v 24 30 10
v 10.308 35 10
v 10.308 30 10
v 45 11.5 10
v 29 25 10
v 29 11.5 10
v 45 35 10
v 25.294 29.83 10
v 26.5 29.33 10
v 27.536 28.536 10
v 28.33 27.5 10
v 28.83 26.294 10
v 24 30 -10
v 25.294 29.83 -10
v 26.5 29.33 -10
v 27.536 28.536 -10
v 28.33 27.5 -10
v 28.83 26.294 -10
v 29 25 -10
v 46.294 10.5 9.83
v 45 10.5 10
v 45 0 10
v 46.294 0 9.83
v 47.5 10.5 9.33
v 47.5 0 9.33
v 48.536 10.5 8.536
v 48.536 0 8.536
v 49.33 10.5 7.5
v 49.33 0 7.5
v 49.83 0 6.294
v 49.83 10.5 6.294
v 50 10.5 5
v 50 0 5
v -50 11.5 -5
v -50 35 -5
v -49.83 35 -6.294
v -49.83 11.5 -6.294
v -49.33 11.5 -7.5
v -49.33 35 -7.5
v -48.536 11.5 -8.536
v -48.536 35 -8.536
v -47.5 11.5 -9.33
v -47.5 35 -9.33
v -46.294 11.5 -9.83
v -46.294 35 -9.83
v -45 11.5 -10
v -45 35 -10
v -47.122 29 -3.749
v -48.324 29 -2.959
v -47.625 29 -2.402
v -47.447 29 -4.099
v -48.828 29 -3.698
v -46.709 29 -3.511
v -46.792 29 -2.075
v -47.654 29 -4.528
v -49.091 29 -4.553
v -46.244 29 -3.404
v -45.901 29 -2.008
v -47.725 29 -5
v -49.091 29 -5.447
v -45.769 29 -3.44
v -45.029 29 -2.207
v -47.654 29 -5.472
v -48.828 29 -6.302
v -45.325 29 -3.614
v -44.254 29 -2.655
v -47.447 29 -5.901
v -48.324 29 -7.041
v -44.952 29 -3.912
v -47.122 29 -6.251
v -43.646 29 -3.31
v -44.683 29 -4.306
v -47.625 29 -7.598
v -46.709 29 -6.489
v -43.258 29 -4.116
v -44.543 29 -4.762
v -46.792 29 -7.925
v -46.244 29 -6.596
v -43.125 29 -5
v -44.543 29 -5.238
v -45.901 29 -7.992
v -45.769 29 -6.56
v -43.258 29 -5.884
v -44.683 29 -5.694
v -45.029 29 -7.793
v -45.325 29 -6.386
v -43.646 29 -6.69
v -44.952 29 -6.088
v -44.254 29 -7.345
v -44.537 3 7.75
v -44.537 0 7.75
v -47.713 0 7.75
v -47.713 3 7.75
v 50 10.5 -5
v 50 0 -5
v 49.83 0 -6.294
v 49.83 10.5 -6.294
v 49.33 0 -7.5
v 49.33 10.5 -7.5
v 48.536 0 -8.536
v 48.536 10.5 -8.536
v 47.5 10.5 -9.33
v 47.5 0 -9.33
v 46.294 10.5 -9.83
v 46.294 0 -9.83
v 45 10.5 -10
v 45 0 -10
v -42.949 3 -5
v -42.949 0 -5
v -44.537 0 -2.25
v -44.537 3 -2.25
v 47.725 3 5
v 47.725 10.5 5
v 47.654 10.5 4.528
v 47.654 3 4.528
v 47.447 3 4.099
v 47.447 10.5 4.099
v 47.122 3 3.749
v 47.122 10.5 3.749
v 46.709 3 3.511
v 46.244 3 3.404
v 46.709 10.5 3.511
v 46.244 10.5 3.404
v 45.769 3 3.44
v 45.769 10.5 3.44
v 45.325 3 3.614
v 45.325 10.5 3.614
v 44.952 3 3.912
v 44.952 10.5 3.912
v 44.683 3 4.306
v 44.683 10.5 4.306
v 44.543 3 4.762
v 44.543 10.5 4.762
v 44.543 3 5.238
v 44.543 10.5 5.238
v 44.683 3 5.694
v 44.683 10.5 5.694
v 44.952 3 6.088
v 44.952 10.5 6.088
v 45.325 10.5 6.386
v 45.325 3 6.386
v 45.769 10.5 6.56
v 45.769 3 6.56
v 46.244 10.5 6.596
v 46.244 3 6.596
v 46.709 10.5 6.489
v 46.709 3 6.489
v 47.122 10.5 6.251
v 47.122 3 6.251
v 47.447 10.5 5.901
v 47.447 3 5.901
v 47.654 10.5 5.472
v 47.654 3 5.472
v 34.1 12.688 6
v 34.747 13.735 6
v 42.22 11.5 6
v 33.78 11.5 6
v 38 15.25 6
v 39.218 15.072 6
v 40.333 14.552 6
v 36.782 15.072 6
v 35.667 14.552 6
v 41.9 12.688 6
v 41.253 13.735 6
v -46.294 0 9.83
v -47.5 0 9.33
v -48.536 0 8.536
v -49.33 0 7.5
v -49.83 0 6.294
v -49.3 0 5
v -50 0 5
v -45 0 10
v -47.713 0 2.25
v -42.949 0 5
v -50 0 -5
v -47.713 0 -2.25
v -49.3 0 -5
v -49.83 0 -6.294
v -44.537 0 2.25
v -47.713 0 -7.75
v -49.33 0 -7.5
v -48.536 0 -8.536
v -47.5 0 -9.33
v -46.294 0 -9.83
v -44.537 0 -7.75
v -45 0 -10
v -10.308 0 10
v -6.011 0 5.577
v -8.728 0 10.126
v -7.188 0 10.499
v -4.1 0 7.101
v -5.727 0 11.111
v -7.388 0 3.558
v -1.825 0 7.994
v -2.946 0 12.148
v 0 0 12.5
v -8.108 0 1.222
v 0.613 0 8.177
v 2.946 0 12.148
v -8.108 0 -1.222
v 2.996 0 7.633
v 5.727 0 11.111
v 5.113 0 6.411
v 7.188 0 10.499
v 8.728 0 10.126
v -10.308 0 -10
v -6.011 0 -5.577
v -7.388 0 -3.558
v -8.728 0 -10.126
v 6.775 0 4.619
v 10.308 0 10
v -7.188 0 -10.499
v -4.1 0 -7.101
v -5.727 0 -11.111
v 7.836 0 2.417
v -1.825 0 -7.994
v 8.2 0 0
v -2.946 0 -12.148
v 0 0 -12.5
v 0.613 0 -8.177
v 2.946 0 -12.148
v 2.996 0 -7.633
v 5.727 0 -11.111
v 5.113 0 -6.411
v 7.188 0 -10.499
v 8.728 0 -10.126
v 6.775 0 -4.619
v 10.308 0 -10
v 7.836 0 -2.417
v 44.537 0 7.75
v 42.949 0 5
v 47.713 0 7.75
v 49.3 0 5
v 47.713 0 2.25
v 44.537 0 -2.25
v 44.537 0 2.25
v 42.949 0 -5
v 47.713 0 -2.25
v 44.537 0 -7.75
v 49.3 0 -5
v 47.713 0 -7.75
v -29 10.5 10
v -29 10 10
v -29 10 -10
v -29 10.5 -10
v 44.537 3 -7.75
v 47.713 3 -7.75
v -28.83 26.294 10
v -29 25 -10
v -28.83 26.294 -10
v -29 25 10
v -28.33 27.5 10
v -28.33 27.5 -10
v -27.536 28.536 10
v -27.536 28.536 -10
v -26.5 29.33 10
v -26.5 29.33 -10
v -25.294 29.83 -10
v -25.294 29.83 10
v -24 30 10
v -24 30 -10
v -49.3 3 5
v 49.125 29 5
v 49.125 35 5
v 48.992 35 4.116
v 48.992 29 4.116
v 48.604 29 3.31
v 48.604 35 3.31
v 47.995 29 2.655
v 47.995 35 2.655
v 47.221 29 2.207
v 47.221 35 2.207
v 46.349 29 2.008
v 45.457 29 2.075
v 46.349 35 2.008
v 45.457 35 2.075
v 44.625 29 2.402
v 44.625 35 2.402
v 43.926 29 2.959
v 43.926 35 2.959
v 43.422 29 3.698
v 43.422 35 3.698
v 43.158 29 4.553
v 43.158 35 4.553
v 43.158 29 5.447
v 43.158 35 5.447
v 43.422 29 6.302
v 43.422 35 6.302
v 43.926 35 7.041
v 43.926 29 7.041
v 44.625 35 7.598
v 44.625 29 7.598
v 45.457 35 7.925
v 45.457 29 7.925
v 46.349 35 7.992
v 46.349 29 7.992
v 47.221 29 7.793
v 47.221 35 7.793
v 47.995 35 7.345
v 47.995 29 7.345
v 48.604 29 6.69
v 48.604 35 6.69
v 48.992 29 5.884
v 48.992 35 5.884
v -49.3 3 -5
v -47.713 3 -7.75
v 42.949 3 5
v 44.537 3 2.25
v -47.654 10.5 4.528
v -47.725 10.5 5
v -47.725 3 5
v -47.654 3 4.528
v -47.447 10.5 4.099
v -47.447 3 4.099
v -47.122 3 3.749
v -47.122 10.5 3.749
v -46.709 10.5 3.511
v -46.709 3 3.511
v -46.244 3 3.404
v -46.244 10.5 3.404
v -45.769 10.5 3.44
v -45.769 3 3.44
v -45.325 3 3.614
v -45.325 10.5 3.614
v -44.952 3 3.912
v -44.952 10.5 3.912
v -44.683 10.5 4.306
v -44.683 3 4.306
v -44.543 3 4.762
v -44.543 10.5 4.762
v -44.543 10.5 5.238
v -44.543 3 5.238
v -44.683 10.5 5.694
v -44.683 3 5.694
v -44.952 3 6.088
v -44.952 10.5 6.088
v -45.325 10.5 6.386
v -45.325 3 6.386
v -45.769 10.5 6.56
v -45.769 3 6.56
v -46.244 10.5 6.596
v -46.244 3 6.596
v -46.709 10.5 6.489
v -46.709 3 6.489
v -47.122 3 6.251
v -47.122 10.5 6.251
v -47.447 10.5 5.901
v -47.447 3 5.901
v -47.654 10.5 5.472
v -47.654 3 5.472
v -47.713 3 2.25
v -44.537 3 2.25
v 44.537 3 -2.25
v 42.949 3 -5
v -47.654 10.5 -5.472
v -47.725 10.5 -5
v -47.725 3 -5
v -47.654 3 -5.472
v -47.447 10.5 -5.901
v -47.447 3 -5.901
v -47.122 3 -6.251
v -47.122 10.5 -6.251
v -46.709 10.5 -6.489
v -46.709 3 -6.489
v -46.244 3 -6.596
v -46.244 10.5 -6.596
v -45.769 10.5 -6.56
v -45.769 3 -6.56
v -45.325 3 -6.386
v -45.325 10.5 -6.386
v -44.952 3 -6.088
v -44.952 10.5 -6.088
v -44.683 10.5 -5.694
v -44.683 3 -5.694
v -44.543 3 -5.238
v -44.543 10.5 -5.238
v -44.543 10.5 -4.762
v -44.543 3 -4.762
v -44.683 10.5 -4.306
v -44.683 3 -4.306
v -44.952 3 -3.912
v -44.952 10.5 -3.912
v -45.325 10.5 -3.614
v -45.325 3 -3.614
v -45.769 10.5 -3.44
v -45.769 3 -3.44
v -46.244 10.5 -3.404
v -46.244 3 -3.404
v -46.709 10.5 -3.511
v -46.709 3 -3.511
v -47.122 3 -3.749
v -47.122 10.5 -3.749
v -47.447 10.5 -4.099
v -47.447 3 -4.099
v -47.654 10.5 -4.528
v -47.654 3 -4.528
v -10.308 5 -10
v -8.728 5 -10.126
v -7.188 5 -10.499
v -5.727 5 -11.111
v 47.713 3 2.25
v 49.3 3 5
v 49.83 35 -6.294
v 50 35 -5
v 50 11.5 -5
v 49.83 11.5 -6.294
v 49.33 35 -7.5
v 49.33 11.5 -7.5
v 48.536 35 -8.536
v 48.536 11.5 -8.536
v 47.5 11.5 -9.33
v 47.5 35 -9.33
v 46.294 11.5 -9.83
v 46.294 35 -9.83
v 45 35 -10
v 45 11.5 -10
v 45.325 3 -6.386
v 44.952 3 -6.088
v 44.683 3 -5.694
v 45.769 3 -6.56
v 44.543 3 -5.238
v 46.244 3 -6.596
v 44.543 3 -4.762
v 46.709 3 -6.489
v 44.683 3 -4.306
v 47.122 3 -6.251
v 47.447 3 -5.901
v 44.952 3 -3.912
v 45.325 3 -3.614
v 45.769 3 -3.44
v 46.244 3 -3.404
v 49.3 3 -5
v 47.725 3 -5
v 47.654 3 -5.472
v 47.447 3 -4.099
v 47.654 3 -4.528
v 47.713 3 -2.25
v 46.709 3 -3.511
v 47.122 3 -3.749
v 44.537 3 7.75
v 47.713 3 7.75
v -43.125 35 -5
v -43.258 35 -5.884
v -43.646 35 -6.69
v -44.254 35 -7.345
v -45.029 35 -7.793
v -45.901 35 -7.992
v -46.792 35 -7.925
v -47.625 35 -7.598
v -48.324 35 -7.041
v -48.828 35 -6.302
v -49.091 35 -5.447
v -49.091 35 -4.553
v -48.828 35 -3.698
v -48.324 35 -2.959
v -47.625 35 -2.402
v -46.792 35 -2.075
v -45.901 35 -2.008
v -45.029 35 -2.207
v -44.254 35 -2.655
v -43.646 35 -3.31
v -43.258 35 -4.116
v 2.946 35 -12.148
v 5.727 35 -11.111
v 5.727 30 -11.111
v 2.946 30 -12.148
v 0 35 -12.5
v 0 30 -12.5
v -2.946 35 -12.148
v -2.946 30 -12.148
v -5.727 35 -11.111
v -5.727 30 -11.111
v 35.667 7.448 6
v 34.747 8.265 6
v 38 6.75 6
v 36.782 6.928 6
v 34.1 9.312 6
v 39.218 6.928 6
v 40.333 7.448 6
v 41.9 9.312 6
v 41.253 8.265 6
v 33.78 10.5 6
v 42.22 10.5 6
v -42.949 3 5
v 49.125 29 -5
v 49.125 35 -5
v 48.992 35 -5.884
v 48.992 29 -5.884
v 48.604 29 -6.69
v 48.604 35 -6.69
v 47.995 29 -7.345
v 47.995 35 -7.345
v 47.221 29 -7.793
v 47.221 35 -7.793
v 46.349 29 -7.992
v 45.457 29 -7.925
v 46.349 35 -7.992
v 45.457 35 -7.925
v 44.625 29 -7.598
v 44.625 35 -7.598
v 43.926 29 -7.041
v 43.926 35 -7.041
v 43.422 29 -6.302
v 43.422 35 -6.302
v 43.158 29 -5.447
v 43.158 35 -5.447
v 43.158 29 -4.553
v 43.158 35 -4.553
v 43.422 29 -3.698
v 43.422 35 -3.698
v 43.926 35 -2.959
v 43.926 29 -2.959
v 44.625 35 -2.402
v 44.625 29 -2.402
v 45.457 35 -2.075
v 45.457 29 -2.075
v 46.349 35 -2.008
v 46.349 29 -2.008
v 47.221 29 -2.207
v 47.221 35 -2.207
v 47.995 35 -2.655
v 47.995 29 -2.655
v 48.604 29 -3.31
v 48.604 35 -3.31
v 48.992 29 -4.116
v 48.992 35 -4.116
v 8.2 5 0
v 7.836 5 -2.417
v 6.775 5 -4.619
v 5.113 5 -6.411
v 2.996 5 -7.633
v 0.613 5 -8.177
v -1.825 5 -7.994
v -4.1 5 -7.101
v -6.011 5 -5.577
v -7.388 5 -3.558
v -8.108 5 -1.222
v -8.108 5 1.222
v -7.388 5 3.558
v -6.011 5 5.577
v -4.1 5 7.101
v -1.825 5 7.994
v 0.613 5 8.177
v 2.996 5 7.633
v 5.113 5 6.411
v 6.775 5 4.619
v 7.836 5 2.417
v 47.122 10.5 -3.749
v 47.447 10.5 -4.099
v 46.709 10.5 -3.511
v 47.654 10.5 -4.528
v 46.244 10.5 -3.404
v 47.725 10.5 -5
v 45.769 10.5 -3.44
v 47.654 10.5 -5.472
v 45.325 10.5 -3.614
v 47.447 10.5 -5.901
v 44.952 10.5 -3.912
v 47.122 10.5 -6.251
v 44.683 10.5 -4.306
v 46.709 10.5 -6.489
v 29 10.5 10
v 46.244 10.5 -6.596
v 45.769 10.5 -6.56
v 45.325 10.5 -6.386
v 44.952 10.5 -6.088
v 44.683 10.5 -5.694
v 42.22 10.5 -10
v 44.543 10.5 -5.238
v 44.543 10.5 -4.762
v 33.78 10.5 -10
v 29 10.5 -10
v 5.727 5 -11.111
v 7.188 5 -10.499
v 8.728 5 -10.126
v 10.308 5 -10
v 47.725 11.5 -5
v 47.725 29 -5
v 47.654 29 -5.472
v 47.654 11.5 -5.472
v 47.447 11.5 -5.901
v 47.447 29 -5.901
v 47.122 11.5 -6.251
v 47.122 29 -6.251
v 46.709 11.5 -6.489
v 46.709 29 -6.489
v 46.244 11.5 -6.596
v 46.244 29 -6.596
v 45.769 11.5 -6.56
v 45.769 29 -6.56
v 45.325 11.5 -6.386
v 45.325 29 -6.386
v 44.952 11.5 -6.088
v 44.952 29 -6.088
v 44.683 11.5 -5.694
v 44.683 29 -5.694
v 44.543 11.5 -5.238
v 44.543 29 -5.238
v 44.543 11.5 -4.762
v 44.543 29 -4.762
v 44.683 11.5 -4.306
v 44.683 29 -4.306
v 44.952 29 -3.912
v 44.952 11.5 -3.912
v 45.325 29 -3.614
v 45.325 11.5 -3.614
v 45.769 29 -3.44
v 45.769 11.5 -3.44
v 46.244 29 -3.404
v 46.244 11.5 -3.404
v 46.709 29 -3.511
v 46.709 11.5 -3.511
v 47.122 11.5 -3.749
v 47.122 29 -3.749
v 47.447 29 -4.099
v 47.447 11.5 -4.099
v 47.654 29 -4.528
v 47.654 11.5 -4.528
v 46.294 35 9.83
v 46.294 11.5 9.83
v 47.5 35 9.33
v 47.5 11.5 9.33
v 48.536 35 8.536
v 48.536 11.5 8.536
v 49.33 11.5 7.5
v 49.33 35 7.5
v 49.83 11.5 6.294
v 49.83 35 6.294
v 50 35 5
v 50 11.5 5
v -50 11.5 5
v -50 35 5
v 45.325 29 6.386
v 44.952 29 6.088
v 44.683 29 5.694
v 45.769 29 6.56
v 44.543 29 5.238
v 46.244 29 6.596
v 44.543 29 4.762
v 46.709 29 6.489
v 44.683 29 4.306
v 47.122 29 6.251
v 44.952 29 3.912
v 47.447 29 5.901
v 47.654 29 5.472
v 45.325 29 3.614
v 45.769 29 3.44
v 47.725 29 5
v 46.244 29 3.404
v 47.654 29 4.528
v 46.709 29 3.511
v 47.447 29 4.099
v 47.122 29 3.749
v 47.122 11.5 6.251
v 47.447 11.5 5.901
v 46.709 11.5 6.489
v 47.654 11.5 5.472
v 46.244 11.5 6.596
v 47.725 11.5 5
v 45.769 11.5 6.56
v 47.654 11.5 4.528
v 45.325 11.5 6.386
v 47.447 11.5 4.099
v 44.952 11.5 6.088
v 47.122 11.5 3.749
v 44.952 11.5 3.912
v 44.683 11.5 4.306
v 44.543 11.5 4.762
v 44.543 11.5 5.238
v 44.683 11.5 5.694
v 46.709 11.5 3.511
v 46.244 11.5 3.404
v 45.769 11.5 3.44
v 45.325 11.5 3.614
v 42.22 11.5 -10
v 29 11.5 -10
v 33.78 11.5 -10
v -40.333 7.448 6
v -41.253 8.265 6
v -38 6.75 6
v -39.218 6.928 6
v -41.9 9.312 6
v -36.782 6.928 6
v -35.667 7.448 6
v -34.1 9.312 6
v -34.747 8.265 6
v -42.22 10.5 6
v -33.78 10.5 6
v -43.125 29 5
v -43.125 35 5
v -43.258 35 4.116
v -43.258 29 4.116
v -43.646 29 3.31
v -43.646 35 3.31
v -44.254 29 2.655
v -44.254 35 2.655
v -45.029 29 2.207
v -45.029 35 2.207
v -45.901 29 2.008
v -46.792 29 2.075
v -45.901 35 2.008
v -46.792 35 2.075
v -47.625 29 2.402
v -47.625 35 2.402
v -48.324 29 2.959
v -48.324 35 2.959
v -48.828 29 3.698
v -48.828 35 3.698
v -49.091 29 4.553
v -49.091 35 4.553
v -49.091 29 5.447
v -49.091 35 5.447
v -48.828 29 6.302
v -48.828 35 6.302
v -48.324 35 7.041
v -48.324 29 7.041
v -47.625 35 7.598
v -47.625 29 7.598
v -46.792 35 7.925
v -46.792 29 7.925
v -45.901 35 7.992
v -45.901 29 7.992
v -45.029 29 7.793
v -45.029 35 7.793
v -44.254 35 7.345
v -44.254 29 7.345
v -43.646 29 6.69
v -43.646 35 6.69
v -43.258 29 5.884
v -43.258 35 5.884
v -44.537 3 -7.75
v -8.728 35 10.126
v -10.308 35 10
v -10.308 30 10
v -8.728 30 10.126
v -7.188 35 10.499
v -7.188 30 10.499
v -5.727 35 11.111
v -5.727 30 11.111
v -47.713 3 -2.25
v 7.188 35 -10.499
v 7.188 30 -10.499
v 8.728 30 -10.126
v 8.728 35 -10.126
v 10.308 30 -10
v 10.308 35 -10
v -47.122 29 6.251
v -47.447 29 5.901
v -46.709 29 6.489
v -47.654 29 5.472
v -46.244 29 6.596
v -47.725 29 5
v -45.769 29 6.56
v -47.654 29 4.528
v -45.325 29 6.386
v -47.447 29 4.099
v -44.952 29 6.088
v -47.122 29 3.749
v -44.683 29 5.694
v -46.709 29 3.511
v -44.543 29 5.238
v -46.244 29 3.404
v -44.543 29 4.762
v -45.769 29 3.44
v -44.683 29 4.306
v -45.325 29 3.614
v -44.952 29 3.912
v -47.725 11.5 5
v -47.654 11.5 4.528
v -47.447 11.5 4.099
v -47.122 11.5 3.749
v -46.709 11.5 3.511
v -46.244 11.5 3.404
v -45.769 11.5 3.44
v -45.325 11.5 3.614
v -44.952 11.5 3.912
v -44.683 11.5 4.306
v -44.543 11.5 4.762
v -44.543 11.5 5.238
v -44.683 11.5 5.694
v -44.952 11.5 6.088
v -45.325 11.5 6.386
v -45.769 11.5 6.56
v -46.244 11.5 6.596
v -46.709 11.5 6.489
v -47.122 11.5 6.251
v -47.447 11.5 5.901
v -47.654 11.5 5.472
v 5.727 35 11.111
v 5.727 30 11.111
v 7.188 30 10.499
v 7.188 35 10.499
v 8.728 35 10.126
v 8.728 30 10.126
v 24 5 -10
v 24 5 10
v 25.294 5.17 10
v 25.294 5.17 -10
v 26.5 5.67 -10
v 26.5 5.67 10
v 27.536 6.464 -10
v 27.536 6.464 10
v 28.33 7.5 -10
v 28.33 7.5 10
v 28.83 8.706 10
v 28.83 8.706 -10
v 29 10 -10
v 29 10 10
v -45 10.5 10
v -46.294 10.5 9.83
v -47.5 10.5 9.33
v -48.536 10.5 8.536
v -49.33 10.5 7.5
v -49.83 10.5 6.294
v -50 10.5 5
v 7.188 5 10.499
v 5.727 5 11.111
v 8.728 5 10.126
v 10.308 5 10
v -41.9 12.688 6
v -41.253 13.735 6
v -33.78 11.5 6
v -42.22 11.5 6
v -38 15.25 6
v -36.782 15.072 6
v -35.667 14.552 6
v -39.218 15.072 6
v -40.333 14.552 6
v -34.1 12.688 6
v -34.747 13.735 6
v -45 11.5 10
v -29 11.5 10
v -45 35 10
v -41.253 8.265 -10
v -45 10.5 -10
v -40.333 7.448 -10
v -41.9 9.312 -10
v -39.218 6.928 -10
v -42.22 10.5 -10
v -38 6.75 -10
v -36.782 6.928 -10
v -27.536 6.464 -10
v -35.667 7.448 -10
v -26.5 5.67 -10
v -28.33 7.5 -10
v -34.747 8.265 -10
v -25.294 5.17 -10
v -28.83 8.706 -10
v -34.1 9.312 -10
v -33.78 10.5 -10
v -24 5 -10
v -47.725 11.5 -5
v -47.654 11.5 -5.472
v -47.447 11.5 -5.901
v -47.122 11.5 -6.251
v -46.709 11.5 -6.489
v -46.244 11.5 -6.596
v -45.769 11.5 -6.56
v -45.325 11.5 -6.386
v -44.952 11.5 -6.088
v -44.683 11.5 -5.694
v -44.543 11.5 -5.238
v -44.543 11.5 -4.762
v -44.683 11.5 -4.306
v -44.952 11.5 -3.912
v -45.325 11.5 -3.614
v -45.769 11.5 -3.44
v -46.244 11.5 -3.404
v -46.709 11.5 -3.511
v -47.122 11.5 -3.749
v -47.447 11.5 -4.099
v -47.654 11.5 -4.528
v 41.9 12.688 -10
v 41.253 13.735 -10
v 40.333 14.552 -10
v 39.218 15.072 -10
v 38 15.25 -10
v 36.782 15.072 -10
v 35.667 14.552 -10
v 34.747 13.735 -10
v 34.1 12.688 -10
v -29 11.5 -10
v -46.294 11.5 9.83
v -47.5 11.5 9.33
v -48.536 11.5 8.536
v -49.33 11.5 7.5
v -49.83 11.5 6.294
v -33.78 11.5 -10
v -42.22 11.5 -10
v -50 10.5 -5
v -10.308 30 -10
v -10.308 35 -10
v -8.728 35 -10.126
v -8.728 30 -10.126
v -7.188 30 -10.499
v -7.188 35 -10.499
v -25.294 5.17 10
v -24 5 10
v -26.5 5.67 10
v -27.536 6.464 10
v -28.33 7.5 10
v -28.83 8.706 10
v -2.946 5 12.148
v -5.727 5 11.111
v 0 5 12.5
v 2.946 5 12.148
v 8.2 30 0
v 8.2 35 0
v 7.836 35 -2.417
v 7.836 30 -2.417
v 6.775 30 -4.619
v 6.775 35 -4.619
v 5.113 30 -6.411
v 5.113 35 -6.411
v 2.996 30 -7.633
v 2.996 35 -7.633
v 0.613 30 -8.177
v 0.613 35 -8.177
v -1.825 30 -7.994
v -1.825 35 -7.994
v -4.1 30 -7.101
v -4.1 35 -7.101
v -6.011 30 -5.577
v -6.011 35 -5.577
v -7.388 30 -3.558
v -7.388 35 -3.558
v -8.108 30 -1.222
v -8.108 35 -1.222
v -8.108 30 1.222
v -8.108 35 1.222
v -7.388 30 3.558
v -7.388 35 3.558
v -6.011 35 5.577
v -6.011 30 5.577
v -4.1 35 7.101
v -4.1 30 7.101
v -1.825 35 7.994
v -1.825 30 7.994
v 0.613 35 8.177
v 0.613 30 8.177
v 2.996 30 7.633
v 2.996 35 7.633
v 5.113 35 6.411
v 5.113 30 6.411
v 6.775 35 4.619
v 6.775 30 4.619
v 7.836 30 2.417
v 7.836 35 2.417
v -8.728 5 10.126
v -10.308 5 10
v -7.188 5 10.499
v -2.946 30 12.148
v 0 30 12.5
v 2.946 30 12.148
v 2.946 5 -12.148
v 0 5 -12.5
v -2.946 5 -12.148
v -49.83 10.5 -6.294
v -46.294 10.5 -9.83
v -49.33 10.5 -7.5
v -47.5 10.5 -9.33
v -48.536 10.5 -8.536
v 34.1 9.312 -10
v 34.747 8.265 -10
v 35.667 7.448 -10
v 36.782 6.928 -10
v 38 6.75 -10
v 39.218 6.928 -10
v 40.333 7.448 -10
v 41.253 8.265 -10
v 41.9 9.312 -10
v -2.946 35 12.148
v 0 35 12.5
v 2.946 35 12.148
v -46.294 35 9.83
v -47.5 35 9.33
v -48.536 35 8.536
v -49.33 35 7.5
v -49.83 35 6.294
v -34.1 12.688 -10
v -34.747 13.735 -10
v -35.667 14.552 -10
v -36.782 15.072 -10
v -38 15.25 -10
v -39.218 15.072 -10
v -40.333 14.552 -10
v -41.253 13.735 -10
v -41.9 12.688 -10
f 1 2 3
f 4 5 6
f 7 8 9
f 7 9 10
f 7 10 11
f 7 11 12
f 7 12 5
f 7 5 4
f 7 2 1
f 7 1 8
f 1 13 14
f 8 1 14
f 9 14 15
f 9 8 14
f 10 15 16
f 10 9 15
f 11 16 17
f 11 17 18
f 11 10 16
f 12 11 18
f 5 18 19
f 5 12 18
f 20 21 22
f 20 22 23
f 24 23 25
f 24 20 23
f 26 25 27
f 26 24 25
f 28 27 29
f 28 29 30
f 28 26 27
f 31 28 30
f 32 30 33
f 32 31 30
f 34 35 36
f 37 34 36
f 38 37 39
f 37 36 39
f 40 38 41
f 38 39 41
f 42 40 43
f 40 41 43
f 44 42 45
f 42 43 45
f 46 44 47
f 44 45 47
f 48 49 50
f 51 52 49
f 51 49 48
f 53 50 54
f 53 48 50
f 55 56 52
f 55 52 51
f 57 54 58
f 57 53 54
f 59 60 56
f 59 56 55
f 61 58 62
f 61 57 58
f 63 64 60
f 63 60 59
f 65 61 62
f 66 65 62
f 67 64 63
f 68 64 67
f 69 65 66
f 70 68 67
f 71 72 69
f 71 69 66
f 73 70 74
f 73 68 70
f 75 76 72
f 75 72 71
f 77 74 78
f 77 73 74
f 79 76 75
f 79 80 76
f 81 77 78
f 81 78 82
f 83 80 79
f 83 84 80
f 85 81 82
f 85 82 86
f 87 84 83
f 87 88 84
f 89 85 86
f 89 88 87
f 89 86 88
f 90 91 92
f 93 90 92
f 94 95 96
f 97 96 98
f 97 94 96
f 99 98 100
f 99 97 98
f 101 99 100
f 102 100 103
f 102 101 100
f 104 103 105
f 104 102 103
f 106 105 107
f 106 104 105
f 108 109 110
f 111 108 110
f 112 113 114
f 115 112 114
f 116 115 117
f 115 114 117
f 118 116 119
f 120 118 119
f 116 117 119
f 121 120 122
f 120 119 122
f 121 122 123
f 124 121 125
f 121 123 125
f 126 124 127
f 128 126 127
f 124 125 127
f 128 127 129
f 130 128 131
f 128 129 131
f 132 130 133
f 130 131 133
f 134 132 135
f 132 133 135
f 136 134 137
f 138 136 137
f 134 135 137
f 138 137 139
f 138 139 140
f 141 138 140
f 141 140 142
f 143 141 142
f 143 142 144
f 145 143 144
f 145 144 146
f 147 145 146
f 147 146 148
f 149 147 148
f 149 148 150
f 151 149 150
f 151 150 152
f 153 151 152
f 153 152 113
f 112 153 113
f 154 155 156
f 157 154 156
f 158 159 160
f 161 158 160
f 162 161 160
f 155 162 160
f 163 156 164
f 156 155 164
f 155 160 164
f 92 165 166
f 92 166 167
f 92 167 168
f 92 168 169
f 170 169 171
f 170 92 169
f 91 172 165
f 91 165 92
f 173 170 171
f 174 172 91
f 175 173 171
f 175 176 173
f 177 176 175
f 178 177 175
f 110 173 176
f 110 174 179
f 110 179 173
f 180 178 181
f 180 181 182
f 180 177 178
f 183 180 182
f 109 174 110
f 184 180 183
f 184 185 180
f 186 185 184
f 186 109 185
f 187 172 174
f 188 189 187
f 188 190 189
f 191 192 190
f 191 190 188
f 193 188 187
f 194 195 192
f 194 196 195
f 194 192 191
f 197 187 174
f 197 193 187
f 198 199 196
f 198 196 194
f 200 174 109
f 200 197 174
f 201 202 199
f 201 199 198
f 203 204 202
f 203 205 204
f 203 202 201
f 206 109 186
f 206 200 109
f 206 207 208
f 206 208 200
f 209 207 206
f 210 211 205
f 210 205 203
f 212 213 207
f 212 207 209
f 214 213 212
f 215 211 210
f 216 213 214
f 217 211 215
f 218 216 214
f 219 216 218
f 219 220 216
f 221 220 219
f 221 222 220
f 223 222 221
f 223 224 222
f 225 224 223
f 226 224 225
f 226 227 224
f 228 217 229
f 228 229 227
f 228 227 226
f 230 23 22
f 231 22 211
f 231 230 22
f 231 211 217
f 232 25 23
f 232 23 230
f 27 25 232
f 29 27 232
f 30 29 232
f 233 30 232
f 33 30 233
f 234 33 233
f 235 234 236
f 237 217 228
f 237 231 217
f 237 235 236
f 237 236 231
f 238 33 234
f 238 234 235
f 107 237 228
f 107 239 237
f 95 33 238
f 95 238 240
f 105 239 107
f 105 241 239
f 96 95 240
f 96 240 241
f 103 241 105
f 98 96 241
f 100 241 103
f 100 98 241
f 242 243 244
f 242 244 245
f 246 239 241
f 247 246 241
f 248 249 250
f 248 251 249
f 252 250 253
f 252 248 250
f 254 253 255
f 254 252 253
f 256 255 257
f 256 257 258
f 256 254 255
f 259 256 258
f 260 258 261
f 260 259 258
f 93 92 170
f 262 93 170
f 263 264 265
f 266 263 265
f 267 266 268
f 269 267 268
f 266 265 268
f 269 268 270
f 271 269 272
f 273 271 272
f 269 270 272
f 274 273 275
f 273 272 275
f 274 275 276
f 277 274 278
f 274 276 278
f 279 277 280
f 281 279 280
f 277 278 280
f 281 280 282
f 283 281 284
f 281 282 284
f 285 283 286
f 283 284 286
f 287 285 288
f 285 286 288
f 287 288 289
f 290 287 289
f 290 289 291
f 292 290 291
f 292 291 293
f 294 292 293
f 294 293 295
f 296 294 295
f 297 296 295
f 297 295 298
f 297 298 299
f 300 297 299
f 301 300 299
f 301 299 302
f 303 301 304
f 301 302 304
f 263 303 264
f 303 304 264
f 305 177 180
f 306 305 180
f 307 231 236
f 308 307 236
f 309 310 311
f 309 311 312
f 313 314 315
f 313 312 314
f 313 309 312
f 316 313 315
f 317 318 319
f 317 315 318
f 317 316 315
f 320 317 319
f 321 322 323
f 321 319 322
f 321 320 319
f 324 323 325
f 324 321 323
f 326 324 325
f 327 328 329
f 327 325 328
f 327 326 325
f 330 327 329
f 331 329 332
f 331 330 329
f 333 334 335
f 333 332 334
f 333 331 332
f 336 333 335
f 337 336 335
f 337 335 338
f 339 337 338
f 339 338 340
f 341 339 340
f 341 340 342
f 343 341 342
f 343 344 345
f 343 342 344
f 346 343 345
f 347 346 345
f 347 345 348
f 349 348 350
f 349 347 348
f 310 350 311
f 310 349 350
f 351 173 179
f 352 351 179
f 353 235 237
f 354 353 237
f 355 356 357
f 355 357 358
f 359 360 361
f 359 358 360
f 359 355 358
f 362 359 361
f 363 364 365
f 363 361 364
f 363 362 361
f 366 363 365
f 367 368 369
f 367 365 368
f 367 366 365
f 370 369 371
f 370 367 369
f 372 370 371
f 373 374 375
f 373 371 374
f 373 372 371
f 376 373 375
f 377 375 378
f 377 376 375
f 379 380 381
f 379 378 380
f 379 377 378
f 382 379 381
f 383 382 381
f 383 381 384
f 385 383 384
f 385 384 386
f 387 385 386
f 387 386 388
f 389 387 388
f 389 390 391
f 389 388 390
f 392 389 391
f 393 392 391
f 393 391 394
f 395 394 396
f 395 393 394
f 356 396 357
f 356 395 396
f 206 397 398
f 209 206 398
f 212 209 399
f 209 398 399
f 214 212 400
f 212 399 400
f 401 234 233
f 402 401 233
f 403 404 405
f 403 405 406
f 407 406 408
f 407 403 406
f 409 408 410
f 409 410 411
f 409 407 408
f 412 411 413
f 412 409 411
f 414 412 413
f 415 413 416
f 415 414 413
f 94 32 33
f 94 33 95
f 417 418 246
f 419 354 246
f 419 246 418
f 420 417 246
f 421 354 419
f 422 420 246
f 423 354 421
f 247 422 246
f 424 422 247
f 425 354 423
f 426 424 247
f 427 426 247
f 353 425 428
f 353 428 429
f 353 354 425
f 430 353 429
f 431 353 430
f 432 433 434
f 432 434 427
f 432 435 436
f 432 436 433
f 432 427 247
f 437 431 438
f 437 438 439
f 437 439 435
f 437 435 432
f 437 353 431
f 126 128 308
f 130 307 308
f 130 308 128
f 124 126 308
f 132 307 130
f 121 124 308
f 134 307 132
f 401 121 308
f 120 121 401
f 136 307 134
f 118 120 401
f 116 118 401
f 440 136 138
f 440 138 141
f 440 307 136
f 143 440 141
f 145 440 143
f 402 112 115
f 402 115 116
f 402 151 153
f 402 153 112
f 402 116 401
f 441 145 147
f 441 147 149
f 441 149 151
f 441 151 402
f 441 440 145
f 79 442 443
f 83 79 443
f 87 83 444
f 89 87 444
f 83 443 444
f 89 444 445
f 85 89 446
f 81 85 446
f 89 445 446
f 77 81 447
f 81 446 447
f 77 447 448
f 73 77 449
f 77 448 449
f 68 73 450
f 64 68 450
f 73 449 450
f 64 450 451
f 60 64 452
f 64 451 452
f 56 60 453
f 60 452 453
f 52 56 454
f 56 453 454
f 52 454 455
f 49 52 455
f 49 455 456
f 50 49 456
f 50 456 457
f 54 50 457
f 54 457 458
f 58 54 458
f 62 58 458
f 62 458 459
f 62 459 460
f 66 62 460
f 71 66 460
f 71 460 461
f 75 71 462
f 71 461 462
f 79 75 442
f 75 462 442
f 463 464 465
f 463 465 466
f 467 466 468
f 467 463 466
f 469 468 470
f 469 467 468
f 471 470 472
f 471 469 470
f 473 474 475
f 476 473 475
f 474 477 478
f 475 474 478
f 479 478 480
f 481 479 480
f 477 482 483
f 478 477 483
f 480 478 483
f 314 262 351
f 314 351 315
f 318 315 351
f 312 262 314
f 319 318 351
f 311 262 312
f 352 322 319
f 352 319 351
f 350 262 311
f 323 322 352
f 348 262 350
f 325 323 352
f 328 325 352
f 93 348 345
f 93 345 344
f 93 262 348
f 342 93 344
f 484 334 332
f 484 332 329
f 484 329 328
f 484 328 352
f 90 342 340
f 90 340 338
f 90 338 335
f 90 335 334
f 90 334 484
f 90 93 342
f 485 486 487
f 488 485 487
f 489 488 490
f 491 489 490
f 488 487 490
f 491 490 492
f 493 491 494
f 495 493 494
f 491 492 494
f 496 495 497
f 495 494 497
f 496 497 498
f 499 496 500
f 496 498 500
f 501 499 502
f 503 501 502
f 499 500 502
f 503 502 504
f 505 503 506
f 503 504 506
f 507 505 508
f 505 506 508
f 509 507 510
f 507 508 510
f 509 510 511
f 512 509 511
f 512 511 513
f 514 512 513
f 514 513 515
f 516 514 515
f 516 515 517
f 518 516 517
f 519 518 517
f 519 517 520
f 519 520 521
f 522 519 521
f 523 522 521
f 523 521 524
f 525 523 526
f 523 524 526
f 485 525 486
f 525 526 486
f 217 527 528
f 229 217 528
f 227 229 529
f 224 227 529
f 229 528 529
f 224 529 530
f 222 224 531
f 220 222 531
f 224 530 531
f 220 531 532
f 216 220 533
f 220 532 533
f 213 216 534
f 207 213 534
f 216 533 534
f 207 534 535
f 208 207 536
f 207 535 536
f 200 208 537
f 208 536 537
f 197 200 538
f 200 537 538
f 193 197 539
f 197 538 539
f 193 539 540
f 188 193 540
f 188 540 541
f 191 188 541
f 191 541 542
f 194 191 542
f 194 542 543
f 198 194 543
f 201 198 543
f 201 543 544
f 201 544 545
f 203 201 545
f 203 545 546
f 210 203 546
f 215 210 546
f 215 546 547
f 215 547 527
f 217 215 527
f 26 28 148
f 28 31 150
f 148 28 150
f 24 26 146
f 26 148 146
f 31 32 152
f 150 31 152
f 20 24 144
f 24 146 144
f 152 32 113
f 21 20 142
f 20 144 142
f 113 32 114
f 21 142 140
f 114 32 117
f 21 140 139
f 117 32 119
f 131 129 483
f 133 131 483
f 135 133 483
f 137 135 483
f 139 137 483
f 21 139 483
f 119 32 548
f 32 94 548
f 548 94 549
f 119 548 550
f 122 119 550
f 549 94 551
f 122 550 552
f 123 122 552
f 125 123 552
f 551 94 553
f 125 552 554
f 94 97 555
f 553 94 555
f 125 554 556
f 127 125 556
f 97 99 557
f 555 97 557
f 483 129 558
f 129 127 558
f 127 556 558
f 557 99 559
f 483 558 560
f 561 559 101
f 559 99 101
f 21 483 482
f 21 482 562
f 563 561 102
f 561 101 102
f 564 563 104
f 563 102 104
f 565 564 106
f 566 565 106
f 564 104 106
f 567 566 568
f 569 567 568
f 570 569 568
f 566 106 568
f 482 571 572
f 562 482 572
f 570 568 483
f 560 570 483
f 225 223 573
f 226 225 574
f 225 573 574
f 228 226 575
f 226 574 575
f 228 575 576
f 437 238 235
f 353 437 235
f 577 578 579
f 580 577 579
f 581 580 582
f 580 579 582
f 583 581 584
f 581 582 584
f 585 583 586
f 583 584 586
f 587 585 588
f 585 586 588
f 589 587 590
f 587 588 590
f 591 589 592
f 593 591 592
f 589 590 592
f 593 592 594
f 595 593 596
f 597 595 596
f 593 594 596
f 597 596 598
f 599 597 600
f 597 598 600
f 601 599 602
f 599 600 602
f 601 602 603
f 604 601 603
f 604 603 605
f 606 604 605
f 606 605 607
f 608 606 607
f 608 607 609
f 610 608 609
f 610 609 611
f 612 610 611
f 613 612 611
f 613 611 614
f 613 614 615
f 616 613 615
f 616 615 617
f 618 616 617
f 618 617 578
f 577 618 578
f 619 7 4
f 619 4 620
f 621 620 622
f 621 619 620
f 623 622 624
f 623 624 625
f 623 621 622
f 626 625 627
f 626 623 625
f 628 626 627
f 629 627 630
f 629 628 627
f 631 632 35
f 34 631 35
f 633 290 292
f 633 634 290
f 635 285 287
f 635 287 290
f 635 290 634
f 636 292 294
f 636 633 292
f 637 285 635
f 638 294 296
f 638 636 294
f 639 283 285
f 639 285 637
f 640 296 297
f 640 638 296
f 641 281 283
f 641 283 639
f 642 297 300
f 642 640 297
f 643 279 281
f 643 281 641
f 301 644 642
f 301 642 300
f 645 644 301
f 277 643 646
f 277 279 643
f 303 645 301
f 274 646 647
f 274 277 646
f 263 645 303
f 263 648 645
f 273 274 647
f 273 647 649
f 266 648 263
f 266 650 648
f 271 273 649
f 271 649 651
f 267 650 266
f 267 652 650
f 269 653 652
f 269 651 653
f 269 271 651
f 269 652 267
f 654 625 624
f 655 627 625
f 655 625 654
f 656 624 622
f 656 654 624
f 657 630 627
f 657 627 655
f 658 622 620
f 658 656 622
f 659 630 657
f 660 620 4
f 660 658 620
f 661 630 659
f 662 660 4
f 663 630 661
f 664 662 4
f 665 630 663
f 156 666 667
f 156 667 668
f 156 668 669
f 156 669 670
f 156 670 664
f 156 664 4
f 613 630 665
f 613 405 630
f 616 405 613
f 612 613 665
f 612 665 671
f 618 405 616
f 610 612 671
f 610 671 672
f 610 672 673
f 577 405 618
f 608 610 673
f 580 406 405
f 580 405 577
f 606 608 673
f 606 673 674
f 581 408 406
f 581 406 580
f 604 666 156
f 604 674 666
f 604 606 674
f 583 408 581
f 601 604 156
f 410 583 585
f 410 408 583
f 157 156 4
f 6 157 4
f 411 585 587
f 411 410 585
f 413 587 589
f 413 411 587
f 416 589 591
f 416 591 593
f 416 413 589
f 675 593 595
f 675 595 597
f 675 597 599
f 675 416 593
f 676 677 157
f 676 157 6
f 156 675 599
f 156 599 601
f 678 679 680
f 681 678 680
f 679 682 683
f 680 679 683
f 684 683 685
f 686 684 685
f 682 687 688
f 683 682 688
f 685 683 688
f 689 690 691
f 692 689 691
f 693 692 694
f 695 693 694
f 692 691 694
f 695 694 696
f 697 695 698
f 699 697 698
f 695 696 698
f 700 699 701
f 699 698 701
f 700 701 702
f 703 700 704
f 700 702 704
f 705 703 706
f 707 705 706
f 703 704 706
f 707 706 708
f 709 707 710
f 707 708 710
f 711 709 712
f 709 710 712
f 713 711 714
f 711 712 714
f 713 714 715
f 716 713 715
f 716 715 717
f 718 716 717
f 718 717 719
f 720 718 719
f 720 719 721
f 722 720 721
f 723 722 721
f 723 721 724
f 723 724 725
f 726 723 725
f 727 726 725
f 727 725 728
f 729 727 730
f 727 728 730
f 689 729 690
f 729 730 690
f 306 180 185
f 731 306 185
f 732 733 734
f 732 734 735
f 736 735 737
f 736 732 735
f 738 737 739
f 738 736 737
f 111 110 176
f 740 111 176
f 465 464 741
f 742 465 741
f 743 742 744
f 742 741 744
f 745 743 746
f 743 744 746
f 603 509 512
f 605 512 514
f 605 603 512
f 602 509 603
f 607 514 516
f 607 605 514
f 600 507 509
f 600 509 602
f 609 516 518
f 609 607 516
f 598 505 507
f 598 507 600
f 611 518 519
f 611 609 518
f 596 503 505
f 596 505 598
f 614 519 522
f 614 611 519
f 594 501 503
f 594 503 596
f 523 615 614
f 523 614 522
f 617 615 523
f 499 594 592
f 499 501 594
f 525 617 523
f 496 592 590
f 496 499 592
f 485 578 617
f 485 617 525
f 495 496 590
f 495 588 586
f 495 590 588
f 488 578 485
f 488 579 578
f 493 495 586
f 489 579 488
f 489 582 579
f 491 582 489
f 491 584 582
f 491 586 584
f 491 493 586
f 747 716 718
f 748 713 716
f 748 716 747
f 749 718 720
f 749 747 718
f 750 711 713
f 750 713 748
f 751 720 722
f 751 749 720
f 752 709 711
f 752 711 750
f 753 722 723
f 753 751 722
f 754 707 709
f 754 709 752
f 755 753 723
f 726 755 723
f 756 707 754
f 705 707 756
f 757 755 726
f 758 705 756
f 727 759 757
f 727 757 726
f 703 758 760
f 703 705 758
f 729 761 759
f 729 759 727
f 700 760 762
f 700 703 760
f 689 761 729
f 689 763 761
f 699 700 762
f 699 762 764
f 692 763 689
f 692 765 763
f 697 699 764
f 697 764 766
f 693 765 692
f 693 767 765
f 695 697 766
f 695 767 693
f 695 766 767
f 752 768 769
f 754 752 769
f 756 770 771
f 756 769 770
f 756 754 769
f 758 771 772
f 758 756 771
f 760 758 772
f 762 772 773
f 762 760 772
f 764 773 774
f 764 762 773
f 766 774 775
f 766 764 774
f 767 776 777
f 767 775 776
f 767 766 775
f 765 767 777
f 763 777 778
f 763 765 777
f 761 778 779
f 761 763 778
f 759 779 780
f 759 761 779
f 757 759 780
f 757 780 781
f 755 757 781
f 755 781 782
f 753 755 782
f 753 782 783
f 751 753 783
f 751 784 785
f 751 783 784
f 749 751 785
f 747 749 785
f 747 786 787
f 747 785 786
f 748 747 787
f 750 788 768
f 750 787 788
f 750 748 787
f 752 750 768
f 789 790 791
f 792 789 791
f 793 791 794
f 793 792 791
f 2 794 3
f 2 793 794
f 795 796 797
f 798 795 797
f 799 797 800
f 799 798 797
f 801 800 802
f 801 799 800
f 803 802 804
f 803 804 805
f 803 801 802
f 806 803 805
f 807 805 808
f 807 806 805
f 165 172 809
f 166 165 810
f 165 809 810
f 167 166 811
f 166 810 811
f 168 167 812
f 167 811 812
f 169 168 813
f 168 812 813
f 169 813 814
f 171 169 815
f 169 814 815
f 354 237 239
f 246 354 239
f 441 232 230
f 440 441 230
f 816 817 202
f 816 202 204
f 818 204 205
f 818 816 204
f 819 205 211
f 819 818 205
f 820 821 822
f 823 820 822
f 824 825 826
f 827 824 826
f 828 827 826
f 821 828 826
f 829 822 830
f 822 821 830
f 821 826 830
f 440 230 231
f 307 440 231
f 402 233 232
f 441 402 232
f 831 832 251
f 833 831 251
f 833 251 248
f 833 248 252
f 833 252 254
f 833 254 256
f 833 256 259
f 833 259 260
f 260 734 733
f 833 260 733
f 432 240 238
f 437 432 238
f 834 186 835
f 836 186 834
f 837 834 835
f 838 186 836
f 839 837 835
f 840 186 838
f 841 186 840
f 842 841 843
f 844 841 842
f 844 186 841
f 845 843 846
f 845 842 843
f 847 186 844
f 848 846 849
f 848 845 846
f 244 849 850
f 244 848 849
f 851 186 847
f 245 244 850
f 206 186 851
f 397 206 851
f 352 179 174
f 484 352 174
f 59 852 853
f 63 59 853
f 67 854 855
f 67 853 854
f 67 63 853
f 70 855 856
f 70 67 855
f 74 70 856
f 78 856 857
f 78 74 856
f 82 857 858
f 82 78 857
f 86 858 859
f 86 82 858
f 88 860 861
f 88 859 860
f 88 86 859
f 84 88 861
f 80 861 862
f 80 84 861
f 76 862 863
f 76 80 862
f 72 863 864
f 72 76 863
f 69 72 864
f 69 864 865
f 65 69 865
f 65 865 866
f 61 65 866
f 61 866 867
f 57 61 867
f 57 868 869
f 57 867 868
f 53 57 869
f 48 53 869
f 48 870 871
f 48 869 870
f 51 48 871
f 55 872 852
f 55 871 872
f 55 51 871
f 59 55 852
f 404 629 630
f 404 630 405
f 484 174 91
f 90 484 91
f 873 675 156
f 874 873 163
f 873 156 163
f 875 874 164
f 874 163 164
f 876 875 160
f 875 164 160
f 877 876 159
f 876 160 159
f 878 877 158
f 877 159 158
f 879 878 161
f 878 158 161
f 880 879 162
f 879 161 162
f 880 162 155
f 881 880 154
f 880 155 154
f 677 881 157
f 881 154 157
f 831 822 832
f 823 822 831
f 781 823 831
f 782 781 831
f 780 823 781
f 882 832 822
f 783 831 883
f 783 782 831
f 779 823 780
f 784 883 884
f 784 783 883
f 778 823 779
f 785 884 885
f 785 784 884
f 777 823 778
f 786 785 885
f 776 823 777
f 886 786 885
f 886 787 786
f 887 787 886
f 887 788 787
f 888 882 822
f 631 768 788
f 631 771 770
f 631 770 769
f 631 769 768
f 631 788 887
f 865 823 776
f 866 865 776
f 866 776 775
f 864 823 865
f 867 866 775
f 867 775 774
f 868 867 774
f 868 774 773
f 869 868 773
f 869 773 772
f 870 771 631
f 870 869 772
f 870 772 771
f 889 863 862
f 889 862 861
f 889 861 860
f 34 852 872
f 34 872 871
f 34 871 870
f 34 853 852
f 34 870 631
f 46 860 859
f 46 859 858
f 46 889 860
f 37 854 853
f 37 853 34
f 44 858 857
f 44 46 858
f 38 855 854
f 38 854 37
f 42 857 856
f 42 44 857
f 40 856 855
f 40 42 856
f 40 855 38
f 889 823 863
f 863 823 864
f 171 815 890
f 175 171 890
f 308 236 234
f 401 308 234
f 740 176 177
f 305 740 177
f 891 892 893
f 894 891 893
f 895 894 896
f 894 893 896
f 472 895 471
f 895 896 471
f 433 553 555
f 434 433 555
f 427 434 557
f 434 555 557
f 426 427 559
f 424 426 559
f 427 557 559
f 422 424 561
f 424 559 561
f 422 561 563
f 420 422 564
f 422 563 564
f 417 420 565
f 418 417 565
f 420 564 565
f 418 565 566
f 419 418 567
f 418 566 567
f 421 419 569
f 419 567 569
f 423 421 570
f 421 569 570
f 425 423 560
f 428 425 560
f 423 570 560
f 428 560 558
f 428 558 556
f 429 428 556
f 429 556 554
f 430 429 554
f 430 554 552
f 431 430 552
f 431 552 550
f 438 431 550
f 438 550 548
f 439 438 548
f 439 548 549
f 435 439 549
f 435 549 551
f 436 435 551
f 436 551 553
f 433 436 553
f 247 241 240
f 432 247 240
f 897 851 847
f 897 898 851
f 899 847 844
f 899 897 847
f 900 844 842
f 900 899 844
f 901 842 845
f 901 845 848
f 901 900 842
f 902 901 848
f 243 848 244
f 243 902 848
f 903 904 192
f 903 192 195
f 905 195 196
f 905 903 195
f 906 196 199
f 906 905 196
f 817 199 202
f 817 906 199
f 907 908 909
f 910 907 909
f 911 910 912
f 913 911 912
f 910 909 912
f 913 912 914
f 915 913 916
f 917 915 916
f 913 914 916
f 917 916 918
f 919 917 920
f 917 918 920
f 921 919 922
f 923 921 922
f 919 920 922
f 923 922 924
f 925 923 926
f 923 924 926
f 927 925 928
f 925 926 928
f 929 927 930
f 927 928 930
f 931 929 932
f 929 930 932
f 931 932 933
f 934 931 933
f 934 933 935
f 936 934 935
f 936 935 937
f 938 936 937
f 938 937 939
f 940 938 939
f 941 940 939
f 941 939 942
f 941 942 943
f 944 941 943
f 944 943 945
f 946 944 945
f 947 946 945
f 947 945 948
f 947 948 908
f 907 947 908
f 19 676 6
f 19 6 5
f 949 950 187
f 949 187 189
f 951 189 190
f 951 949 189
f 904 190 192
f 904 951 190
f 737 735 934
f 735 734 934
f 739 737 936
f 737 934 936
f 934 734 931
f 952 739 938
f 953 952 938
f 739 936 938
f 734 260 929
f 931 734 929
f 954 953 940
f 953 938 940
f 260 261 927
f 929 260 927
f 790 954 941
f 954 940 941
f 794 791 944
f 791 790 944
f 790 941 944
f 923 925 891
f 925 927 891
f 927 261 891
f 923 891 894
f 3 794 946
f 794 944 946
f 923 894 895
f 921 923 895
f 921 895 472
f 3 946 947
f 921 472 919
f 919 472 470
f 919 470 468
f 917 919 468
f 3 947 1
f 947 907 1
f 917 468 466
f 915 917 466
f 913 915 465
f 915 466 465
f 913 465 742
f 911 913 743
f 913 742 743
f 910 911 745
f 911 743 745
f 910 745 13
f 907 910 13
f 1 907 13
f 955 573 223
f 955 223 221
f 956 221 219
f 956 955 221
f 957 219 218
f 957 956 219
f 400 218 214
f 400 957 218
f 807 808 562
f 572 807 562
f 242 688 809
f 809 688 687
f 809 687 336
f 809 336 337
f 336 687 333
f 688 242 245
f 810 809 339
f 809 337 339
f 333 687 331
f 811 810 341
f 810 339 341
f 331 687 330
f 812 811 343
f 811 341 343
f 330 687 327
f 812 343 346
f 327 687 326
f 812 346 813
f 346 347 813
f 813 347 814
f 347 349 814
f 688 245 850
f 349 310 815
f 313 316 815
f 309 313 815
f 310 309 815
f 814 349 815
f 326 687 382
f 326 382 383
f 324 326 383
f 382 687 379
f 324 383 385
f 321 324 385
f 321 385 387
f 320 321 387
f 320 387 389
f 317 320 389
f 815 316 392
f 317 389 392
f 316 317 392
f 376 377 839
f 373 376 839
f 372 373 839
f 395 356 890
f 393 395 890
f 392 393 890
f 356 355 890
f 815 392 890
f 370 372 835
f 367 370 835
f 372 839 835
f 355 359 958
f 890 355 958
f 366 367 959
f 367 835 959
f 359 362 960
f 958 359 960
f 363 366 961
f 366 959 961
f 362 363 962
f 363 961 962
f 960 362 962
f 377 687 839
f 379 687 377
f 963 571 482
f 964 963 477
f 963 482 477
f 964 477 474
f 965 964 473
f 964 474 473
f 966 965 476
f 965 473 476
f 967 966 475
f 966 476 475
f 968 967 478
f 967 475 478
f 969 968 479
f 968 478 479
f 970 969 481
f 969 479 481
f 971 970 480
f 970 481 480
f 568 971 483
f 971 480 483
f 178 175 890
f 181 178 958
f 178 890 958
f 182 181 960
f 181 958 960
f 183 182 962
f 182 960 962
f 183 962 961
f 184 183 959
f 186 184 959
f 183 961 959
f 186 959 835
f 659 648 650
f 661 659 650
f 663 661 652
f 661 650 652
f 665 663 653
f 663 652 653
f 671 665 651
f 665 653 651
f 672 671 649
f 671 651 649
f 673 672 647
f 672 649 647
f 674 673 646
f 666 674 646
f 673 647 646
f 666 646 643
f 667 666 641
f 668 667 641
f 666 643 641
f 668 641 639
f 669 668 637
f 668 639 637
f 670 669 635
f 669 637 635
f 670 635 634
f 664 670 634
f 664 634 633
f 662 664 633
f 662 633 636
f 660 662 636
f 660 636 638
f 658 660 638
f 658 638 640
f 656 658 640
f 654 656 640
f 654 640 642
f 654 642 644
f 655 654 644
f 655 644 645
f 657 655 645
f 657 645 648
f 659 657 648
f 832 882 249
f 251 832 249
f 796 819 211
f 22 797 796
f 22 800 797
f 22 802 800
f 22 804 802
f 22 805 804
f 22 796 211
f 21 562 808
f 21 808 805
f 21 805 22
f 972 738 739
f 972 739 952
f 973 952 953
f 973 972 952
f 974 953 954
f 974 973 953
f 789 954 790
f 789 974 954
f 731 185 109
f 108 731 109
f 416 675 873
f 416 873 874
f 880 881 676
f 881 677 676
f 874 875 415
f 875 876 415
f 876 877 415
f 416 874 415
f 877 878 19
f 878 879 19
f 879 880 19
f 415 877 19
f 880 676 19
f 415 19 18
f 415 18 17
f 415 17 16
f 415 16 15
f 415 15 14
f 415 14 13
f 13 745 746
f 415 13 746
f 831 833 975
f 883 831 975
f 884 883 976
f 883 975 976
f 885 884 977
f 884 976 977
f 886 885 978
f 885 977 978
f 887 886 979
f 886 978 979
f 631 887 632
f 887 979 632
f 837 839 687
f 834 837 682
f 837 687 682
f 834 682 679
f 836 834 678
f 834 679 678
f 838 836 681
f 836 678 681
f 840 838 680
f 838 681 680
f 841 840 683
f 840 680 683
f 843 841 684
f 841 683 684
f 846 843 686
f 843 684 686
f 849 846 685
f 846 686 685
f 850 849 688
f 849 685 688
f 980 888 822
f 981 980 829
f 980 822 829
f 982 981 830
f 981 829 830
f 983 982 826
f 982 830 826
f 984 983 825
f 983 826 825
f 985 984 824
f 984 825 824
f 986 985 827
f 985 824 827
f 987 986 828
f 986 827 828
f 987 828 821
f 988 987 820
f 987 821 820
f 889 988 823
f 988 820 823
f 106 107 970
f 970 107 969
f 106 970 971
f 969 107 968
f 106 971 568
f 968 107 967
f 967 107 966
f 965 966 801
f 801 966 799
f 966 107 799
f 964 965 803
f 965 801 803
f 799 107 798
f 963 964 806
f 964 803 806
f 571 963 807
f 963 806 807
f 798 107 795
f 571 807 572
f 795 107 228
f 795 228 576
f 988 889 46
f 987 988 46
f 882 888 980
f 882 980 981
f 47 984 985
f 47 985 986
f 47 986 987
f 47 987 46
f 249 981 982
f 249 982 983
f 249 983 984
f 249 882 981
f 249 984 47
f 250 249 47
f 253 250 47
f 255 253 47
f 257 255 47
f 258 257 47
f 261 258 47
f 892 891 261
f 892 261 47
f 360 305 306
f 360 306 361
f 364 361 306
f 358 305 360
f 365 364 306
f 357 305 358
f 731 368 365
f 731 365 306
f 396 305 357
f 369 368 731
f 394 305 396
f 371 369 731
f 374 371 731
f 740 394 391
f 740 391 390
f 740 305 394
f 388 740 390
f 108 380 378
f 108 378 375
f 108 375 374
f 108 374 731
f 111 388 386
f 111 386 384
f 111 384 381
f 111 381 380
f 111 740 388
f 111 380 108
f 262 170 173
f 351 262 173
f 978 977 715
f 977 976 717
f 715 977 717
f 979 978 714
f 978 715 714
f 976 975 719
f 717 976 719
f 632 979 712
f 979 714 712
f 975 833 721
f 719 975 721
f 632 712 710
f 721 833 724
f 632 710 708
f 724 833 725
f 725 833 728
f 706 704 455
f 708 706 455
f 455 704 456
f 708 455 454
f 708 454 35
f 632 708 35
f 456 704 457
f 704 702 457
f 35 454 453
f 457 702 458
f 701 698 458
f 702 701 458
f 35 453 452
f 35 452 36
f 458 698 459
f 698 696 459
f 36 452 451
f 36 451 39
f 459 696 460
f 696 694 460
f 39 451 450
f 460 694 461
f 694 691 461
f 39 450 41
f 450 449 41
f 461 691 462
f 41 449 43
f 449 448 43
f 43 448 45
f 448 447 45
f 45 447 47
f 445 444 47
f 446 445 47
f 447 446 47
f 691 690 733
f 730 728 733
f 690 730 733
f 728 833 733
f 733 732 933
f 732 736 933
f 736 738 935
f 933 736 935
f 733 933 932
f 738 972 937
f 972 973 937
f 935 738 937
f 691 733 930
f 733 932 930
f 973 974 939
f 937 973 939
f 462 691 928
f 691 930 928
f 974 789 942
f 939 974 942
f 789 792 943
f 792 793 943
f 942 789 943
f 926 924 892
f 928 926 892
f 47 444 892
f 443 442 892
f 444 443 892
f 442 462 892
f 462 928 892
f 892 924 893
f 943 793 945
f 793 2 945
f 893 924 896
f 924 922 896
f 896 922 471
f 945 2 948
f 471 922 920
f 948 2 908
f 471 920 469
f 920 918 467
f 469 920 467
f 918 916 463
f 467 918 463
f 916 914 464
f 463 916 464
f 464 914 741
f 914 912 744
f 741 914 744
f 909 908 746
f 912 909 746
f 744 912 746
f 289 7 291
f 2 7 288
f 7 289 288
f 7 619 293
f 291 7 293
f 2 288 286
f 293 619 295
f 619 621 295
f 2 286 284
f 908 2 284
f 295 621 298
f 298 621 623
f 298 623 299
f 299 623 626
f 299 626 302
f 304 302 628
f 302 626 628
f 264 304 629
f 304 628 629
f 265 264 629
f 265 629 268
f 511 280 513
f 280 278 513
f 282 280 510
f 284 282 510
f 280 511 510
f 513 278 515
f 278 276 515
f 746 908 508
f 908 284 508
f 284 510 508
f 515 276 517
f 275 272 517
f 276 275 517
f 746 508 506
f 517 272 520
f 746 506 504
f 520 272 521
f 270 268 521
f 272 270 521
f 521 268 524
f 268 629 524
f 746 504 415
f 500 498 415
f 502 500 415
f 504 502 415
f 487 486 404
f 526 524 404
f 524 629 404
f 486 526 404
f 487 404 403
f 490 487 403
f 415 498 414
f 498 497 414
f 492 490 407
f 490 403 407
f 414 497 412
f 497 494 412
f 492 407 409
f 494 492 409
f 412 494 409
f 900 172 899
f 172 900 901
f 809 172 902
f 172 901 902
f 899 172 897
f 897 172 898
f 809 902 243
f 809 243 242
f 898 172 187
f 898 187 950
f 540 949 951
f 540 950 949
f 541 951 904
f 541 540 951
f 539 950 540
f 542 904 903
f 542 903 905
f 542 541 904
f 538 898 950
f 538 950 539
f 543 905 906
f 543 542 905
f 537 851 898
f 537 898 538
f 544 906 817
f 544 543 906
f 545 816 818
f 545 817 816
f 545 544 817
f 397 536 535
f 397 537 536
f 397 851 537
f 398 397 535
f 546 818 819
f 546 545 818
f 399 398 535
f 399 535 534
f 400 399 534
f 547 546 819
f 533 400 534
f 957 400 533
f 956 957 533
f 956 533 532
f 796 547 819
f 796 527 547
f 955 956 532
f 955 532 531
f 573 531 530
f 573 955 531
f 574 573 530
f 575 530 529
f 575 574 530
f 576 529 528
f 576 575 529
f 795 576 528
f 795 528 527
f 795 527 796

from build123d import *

# Parameters (mm, degrees)
SKETCH1_W               = 88
SKETCH1_H               = 20
BOSS_EXTRUDE1_DEPTH     = 35
SKETCH2_R               = 4.25
CUT_EXTRUDE1_DEPTH      = 21
SKETCH7_R               = 12.5
BOSS_EXTRUDE2_DEPTH     = 35
SKETCH4_R               = 8.2
CUT_EXTRUDE3_DEPTH      = 36
FILLET2_R               = 10
SKETCH10_W              = 58
SKETCH10_H              = 25
CUT_EXTRUDE5_DEPTH      = 13.5
CUT_EXTRUDE5_DEPTH_BACK = 13.5
FILLET3_R               = 5
SKETCH11_W              = 20
SKETCH11_H              = 35
BOSS_EXTRUDE3_DEPTH     = 6
SKETCH12_R              = 1.6
CUT_EXTRUDE6_DEPTH      = 36
FILLET5_R               = 5
SKETCH13_R              = 4.25
BOSS_EXTRUDE4_DEPTH     = 4
SKETCH14_W              = 100
SKETCH14_H              = 1
CUT_EXTRUDE7_DEPTH      = 23.5
SKETCH15_R              = 3
CUT_EXTRUDE8_DEPTH      = 6
CUT_EXTRUDE9_DEPTH      = 3


with BuildPart() as part:
    # Sketch1 → Boss-Extrude1 (new body)
    with BuildSketch(Plane(origin=(0, 0, 0), x_dir=(1, 0, 0), z_dir=(0, 1, 0))):
        Rectangle(SKETCH1_W, SKETCH1_H)
    extrude(amount=BOSS_EXTRUDE1_DEPTH)

    # Sketch2 → Cut-Extrude1 (cut, through all)
    with BuildSketch(Plane.XY.offset(10)):
        with Locations((-38, 11)):
            Circle(SKETCH2_R)
        with Locations((38, 11)):
            Circle(SKETCH2_R)
    extrude(amount=-CUT_EXTRUDE1_DEPTH, mode=Mode.SUBTRACT)

    # Sketch7 → Boss-Extrude2 (add)
    with BuildSketch(Plane(origin=(0, 35, 0), x_dir=(1, 0, 0), z_dir=(0, 1, 0))):
        Circle(SKETCH7_R)
    extrude(amount=-BOSS_EXTRUDE2_DEPTH)

    # Sketch4 → Cut-Extrude3 (cut, through all)
    with BuildSketch(Plane(origin=(0, 35, 0), x_dir=(1, 0, 0), z_dir=(0, 1, 0))):
        Circle(SKETCH4_R)
    extrude(amount=-CUT_EXTRUDE3_DEPTH, mode=Mode.SUBTRACT)

    # Fillet2
    fillet2_edges = [part.edges().sort_by_distance(p)[0] for p in [
        (7.5, 17.5, -10),
        (7.5, 17.5, 10),
        (-7.5, 17.5, -10),
        (-7.5, 17.5, 10),
    ]]
    fillet(fillet2_edges, radius=FILLET2_R)

    # Sketch10 → Cut-Extrude5 (cut, two sides)
    with BuildSketch(Plane.XY) as cut_extrude5_sk:
        with Locations((0, 17.5)):
            Rectangle(SKETCH10_W, SKETCH10_H)
    extrude(amount=CUT_EXTRUDE5_DEPTH, mode=Mode.SUBTRACT)
    extrude(cut_extrude5_sk.sketch, amount=-CUT_EXTRUDE5_DEPTH_BACK, mode=Mode.SUBTRACT)

    # Fillet3
    fillet3_edges = [part.edges().sort_by_distance(p)[0] for p in [
        (-29, 30, 0),
        (-29, 5, 0),
        (29, 30, 0),
        (29, 5, 0),
    ]]
    fillet(fillet3_edges, radius=FILLET3_R)

    # Sketch11 → Boss-Extrude3 (add)
    with BuildSketch(Plane(origin=(44, 0, 0), x_dir=(0, 0, -1), z_dir=(1, 0, 0))):
        with Locations((0, 17.5)):
            Rectangle(SKETCH11_W, SKETCH11_H)
    boss_extrude3 = extrude(amount=BOSS_EXTRUDE3_DEPTH)

    # Sketch12 → Cut-Extrude6 (cut, through all)
    with BuildSketch(Plane(origin=(0, 35, 0), x_dir=(1, 0, 0), z_dir=(0, 1, 0))):
        with Locations((46.124852936, 5)):
            Circle(SKETCH12_R)
        with Locations((46.124852936, -5)):
            Circle(SKETCH12_R)
    cut_extrude6 = extrude(amount=-CUT_EXTRUDE6_DEPTH, mode=Mode.SUBTRACT)

    # Mirror1: Boss-Extrude3, Cut-Extrude6 across plane
    add(boss_extrude3.mirror(Plane(origin=(0, 0, 0), x_dir=(0, 0, 1), z_dir=(1, 0, 0))))
    add(cut_extrude6.mirror(Plane(origin=(0, 0, 0), x_dir=(0, 0, 1), z_dir=(1, 0, 0))), mode=Mode.SUBTRACT)

    # Fillet5
    fillet5_edges = [part.edges().sort_by_distance(p)[0] for p in [
        (50, 17.5, -10),
        (50, 17.5, 10),
        (-50, 17.5, 10),
        (-50, 17.5, -10),
    ]]
    fillet(fillet5_edges, radius=FILLET5_R)

    # Sketch13 → Boss-Extrude4 (add)
    with BuildSketch(Plane.XY.offset(10)):
        with Locations((38, 11)):
            Circle(SKETCH13_R)
        with Locations((-38, 11)):
            Circle(SKETCH13_R)
    extrude(amount=-BOSS_EXTRUDE4_DEPTH)

    # Sketch14 → Cut-Extrude7 (cut, through all)
    with BuildSketch(Plane(origin=(0, 0, -10), x_dir=(-1, 0, 0), z_dir=(0, 0, -1))):
        with Locations((0, 11)):
            Rectangle(SKETCH14_W, SKETCH14_H)
    extrude(amount=-CUT_EXTRUDE7_DEPTH, mode=Mode.SUBTRACT)

    # Sketch15 → Cut-Extrude8 (cut)
    with BuildSketch(Plane(origin=(0, 35, 0), x_dir=(1, 0, 0), z_dir=(0, 1, 0))):
        with Locations((-46.124852936, 5)):
            Circle(SKETCH15_R)
        with Locations((-46.124852936, -5)):
            Circle(SKETCH15_R)
        with Locations((46.124852936, 5)):
            Circle(SKETCH15_R)
        with Locations((46.124852936, -5)):
            Circle(SKETCH15_R)
    extrude(amount=-CUT_EXTRUDE8_DEPTH, mode=Mode.SUBTRACT)

    # Sketch16 → Cut-Extrude9 (cut)
    with BuildSketch(Plane.XZ):
        Polygon((-42.949426456, 5), (-44.537139696, 7.75), (-47.712566176, 7.75), (-49.300279417, 5), (-47.712566176, 2.25), (-44.537139696, 2.25), align=None)
        Polygon((-42.949426456, -5), (-44.537139696, -2.25), (-47.712566176, -2.25), (-49.300279417, -5), (-47.712566176, -7.75), (-44.537139696, -7.75), align=None)
        Polygon((49.300279417, 5), (47.712566176, 7.75), (44.537139696, 7.75), (42.949426456, 5), (44.537139696, 2.25), (47.712566176, 2.25), align=None)
        Polygon((49.300279417, -5), (47.712566176, -2.25), (44.537139696, -2.25), (42.949426456, -5), (44.537139696, -7.75), (47.712566176, -7.75), align=None)
    extrude(amount=-CUT_EXTRUDE9_DEPTH, mode=Mode.SUBTRACT)


solid = part.part
